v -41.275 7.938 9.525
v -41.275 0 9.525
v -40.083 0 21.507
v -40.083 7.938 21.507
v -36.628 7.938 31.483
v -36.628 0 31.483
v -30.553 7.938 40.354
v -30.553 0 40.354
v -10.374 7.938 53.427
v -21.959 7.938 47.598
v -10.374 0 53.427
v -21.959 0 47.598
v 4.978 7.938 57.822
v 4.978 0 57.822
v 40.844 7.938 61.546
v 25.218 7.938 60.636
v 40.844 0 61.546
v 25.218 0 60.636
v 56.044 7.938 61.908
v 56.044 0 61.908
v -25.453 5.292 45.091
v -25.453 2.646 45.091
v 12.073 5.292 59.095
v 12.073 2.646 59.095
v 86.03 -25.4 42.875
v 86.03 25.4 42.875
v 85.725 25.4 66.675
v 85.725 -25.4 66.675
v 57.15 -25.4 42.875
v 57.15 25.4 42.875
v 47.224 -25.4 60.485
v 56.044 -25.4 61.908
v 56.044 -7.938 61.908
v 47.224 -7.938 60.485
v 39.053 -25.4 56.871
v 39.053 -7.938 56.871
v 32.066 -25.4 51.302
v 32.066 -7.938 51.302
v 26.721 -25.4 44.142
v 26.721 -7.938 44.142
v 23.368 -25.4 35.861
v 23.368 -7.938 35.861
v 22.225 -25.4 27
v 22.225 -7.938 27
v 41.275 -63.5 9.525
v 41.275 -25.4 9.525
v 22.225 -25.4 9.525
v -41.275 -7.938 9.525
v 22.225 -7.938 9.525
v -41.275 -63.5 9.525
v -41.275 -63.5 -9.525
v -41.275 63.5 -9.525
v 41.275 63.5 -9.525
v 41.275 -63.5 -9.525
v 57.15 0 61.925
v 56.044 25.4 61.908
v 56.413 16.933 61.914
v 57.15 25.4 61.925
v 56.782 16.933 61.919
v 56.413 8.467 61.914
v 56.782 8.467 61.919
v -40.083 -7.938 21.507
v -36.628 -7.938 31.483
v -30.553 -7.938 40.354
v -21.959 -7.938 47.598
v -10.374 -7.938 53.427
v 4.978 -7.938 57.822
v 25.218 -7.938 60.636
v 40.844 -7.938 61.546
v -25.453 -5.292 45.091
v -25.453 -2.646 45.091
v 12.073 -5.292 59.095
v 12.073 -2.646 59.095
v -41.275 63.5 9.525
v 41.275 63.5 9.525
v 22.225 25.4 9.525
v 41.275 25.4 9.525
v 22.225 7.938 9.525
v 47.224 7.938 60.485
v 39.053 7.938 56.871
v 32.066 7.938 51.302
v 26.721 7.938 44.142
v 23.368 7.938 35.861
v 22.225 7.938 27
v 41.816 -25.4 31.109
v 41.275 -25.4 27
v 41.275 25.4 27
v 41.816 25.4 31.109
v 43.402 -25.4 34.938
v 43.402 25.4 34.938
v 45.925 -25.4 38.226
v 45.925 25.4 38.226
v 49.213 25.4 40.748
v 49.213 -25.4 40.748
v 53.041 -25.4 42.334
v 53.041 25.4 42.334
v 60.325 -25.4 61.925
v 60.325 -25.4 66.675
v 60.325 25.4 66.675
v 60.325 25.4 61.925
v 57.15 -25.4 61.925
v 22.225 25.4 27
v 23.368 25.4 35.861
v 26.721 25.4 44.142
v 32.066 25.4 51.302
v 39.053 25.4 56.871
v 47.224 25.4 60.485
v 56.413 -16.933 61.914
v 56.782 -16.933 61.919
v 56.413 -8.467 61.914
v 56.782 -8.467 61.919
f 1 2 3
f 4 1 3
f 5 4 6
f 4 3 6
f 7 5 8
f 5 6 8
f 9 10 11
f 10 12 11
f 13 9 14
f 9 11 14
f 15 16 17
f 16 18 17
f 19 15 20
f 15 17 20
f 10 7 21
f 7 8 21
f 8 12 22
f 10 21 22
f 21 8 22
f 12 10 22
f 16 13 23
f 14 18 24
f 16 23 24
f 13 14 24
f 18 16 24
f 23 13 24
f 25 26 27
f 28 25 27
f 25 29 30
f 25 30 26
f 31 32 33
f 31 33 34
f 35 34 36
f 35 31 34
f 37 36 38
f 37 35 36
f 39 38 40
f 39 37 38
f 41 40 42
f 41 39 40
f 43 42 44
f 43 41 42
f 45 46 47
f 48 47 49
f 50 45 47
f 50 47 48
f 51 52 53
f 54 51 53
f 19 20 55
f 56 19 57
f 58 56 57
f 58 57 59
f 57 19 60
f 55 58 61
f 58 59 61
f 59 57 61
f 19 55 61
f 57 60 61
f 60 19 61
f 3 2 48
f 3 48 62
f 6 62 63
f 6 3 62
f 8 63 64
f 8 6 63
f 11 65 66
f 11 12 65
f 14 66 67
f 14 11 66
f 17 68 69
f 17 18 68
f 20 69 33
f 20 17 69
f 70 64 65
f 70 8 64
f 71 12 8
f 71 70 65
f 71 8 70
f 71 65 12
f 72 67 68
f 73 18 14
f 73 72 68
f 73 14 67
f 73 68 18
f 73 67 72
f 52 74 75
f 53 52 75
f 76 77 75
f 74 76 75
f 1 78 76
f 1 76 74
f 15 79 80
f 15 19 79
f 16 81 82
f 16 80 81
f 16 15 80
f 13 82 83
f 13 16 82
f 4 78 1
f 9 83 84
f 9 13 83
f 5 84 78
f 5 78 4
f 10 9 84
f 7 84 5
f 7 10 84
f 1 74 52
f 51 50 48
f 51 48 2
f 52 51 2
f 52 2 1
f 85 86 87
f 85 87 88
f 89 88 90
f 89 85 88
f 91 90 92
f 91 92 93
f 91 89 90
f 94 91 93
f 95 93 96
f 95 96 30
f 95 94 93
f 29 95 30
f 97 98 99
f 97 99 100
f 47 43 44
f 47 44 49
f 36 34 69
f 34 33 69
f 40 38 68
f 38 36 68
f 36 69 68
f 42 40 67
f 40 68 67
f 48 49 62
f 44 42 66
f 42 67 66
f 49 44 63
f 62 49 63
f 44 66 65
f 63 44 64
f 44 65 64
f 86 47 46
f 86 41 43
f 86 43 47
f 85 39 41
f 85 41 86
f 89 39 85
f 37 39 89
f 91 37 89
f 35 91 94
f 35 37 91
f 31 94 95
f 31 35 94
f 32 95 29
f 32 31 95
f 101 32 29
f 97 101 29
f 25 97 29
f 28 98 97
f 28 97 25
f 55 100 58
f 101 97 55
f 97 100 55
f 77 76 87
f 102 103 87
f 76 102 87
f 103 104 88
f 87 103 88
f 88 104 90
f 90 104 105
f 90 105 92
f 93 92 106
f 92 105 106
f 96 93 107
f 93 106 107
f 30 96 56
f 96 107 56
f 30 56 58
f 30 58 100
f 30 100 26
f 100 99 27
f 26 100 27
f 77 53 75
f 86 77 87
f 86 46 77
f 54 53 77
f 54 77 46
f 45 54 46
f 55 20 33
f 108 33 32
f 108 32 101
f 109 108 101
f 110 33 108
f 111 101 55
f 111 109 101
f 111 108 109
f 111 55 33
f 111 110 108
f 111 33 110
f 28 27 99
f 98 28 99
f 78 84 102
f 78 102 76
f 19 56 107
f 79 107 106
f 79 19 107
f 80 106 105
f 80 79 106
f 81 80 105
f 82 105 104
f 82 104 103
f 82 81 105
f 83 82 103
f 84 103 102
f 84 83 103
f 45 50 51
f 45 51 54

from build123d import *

# Parameters (mm, degrees)
F1_DEPTH = 63.5
F2_DEPTH = 25.4
F3_DEPTH = 7.9375


with BuildPart() as f1:
    # F0 (on Front) → F1 (new body, symmetric)
    with BuildSketch(Plane.XZ):
        Polygon((-41.275, 9.525), (-41.275, -9.525), (41.275, -9.525), (41.275, 9.525), (22.225, 9.525), align=None)
    extrude(amount=F1_DEPTH, both=True)

    # F0 (on Front) → F2 (join, symmetric)
    with BuildSketch(Plane.XZ):
        with BuildLine():
            Line((22.225, 9.525), (41.275, 9.525))
            Line((41.275, 9.525), (41.275, 27.0002))
            ThreePointArc((41.275, 27.0002), (45.9246798487, 38.2255201513), (57.15, 42.8752))
            Line((57.15, 42.8752), (60.325, 42.8752))
            Line((60.325, 42.8752), (60.325, 61.9252))
            Line((60.325, 61.9252), (57.15, 61.9252))
            add(Edge.make_bspline(
                [(56.0439940471, 61.9076830922), (56.4136969839, 61.9136063659), (56.7823811234, 61.9194348071), (57.15, 61.9252)],
                knots=[110.5340718473, 110.5340718473, 110.5340718473, 110.5340718473, 111.5045361635, 111.5045361635, 111.5045361635, 111.5045361635], degree=3))
            ThreePointArc((56.0439940471, 61.9076830922), (32.0663112471, 51.3017263625), (22.225, 27.0002))
            Line((22.225, 27.0002), (22.225, 9.525))
        make_face()
        Polygon((60.325, 66.675), (60.325, 61.9252), (60.325, 42.8752), (86.0297148728, 42.8752), (85.725, 66.675), align=None)
    extrude(amount=F2_DEPTH, both=True)

    # F0 (on Front) → F3 (join, symmetric)
    with BuildSketch(Plane.XZ):
        with BuildLine():
            add(Edge.make_bspline(
                [(-41.275, 9.525), (-41.3895917306, 59.328141832), (13.9355205015, 61.2330332862), (56.0439940471, 61.9076830922)],
                knots=[0, 0, 0, 0, 110.5340718473, 110.5340718473, 110.5340718473, 110.5340718473], degree=3))
            Line((-41.275, 9.525), (22.225, 9.525))
            Line((22.225, 9.525), (22.225, 27.0002))
            ThreePointArc((22.225, 27.0002), (32.0663112471, 51.3017263625), (56.0439940471, 61.9076830922))
        make_face()
    extrude(amount=F3_DEPTH, both=True)


solid = f1.part
